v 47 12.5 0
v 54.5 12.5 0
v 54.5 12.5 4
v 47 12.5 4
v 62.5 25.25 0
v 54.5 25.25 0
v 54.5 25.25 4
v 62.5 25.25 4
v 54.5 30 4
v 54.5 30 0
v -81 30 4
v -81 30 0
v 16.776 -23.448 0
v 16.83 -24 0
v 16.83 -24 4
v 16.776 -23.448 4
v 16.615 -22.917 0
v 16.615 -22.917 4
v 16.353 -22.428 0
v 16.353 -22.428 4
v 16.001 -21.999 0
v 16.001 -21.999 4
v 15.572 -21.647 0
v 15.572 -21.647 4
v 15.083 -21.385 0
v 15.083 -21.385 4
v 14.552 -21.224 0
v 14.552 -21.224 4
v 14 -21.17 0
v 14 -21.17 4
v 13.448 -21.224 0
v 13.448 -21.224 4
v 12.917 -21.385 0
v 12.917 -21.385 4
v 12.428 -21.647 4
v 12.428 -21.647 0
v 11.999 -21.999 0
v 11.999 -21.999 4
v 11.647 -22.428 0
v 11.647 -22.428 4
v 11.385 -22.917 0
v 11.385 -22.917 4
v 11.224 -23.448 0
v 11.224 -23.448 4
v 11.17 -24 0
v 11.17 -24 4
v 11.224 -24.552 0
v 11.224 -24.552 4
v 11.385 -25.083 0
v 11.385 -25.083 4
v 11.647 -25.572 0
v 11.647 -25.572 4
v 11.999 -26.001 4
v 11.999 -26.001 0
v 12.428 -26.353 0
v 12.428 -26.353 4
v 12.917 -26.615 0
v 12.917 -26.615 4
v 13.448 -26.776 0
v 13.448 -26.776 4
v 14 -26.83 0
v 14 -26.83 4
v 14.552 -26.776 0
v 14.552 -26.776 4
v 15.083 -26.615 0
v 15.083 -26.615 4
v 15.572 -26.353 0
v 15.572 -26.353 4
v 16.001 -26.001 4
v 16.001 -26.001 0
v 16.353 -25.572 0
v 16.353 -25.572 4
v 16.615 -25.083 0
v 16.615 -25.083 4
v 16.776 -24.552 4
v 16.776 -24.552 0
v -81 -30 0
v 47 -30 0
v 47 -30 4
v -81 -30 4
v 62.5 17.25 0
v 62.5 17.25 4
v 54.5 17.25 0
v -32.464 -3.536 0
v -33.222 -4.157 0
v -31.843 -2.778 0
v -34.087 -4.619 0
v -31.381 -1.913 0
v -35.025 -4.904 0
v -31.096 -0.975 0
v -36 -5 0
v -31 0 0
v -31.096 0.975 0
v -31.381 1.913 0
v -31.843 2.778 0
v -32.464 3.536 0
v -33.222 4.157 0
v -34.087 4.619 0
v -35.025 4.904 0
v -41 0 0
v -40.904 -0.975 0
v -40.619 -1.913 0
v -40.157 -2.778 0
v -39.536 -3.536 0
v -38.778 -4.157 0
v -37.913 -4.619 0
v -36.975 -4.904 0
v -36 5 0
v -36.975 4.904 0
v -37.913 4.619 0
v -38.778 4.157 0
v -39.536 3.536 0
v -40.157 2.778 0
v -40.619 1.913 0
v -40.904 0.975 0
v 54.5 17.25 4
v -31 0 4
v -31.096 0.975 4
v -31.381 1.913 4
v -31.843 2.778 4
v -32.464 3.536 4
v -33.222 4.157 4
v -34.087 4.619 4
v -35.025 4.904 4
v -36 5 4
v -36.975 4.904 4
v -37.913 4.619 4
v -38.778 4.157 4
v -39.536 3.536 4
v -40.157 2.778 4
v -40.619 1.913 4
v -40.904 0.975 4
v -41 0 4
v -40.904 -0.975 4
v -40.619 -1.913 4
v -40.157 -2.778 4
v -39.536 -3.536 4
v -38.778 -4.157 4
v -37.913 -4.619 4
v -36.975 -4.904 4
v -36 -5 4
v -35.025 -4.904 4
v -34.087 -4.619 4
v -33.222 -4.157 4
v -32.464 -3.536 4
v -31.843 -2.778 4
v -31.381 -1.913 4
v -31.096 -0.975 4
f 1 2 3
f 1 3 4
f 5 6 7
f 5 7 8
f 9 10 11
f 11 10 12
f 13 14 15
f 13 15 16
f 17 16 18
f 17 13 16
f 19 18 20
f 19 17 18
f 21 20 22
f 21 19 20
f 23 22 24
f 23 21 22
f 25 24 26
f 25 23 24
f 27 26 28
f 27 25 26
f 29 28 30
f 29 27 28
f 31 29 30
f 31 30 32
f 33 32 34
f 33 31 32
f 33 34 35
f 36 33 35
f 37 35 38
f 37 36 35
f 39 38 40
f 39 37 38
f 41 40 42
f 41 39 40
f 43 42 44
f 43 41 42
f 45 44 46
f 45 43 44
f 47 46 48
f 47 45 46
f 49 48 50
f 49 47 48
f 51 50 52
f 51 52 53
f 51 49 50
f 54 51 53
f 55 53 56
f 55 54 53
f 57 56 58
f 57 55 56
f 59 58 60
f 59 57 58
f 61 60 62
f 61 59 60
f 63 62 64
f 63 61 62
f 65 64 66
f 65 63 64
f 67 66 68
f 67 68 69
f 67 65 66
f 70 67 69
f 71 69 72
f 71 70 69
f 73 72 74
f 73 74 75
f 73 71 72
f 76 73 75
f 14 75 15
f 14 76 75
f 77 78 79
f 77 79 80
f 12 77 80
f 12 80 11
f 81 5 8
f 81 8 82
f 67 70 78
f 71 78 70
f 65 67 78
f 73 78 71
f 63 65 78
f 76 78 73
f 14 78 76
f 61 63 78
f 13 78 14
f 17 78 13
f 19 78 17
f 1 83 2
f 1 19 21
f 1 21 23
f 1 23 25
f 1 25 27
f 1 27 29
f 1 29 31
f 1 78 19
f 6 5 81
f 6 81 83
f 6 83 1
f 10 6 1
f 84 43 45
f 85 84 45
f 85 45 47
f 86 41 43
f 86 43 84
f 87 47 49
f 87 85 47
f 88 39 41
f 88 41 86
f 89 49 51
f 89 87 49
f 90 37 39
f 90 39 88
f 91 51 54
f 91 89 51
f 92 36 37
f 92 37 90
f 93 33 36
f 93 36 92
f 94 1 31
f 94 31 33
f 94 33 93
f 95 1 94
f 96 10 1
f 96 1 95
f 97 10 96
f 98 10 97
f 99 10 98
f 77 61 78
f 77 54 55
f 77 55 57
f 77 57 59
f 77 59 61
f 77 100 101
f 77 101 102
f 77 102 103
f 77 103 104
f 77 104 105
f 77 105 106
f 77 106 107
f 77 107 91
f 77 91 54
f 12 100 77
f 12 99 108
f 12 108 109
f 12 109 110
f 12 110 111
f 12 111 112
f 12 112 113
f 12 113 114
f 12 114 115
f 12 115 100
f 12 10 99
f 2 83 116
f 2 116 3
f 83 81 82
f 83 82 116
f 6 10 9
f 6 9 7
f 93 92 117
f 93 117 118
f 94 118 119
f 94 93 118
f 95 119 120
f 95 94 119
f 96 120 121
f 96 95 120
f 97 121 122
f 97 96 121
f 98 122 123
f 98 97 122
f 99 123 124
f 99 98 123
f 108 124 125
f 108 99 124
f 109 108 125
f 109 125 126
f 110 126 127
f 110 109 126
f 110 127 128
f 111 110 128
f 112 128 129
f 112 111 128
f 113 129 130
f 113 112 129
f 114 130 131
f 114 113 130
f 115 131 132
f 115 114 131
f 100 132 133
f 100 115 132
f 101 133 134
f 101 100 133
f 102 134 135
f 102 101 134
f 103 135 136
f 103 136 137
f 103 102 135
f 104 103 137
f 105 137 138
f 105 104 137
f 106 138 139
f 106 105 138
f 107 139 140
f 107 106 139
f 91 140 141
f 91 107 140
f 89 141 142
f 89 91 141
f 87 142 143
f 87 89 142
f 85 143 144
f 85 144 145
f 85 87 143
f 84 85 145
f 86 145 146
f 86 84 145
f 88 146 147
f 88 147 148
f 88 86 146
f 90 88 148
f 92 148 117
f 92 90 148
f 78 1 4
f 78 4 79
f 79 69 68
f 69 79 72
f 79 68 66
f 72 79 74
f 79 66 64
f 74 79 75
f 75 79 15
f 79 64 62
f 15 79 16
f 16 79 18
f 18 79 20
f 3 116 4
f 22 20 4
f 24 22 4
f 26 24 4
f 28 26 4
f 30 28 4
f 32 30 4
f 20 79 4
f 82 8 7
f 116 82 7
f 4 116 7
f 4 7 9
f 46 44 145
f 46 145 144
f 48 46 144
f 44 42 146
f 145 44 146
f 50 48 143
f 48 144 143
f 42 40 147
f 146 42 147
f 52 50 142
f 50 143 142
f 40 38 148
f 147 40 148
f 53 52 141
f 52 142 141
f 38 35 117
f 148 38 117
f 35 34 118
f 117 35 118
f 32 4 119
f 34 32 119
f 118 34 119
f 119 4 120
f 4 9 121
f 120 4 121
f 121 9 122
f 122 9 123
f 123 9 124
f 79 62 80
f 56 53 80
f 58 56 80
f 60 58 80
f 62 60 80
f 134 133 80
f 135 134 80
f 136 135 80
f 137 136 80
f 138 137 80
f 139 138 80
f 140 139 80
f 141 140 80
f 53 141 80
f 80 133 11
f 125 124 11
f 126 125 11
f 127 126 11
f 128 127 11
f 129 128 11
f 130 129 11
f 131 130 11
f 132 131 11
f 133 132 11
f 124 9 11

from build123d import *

# Parameters (mm, degrees)
SKETCH1_R           = 5
SKETCH1_R_2         = 2.83
BOSS_EXTRUDE1_DEPTH = 4


with BuildPart() as part:
    # Sketch1 → Boss-Extrude1 (new body)
    with BuildSketch(Plane.XY):
        Polygon((47, 30), (54.5, 30), (54.5, 25.25), (62.5, 25.25), (62.5, 17.25), (54.5, 17.25), (54.5, 12.5), (47, 12.5), (47, -30), (-81, -30), (-81, 30), align=None)
        with Locations((-36, 0)):
            Circle(SKETCH1_R, mode=Mode.SUBTRACT)
        with Locations((14, -24)):
            Circle(SKETCH1_R_2, mode=Mode.SUBTRACT)
    extrude(amount=BOSS_EXTRUDE1_DEPTH)


solid = part.part
